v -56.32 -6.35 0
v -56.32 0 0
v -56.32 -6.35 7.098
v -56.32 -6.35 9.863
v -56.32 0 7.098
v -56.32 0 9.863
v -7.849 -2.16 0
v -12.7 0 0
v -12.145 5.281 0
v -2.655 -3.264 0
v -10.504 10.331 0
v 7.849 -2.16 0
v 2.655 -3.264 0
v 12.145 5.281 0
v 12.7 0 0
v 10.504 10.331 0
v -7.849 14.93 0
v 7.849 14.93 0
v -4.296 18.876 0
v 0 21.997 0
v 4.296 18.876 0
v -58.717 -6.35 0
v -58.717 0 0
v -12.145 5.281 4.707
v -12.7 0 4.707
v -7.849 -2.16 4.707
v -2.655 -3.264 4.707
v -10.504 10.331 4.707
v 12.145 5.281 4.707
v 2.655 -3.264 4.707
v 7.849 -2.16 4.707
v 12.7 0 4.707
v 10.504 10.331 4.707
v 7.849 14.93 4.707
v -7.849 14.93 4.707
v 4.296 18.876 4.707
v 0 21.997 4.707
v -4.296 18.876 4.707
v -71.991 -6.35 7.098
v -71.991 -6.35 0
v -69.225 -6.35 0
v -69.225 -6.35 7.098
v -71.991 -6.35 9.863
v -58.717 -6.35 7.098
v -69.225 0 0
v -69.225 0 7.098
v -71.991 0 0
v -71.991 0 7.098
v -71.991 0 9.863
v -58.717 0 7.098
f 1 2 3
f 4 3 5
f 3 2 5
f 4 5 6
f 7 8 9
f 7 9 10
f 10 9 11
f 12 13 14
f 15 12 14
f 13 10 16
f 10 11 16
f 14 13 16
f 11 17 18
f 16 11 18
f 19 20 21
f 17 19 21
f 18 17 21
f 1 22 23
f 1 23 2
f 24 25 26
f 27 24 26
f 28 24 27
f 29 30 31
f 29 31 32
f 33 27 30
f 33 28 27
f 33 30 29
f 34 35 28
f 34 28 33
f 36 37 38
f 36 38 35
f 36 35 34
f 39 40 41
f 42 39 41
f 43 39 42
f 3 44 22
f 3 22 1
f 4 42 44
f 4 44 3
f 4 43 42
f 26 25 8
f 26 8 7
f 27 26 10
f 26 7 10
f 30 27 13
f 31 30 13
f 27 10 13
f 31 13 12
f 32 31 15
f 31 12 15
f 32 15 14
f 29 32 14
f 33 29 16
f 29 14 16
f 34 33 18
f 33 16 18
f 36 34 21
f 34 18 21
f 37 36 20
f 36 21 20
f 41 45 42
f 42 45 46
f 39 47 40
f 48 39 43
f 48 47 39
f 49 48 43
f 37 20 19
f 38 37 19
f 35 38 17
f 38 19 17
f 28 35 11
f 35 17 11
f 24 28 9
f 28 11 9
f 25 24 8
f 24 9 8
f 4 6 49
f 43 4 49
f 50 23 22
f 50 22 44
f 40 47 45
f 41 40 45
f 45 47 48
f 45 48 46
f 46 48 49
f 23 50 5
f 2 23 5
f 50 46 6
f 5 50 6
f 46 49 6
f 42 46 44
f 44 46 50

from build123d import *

# Parameters (mm, degrees)
F1_DEPTH = 4.7067850828
F2_W     = 2.7653202415
F2_H     = 7.0976610295
F2_W_2   = 2.3966133595
F3_DEPTH = 6.35


with BuildPart() as f1:
    # F0 (on Top) → F1 (new body)
    with BuildSketch(Plane.XY):
        with BuildLine():
            ThreePointArc((0, 21.9970452561), (-9.2970452561, 12.7), (-12.7, 0))
            ThreePointArc((-12.7, 0), (0, -3.4029547439), (12.7, 0))
            ThreePointArc((12.7, 0), (9.2970452561, 12.7), (0, 21.9970452561))
        make_face()
    extrude(amount=F1_DEPTH)


with BuildPart() as f3:
    # F2 (on Front) → F3 (new body)
    with BuildSketch(Plane.XZ):
        with Locations((-70.6079043448, 3.5488305148)):
            Rectangle(F2_W, F2_H)
        Polygon((-71.9905644655, 9.8629835993), (-71.9905644655, 7.0976610295), (-69.2252442241, 7.0976610295), (-58.7170161307, 7.0976610295), (-56.3204027712, 7.0976610295), (-56.3204027712, 9.8629835993), align=None)
        with Locations((-57.518709451, 3.5488305148)):
            Rectangle(F2_W_2, F2_H)
    extrude(amount=F3_DEPTH)


solid = Compound([f1.part, f3.part])
